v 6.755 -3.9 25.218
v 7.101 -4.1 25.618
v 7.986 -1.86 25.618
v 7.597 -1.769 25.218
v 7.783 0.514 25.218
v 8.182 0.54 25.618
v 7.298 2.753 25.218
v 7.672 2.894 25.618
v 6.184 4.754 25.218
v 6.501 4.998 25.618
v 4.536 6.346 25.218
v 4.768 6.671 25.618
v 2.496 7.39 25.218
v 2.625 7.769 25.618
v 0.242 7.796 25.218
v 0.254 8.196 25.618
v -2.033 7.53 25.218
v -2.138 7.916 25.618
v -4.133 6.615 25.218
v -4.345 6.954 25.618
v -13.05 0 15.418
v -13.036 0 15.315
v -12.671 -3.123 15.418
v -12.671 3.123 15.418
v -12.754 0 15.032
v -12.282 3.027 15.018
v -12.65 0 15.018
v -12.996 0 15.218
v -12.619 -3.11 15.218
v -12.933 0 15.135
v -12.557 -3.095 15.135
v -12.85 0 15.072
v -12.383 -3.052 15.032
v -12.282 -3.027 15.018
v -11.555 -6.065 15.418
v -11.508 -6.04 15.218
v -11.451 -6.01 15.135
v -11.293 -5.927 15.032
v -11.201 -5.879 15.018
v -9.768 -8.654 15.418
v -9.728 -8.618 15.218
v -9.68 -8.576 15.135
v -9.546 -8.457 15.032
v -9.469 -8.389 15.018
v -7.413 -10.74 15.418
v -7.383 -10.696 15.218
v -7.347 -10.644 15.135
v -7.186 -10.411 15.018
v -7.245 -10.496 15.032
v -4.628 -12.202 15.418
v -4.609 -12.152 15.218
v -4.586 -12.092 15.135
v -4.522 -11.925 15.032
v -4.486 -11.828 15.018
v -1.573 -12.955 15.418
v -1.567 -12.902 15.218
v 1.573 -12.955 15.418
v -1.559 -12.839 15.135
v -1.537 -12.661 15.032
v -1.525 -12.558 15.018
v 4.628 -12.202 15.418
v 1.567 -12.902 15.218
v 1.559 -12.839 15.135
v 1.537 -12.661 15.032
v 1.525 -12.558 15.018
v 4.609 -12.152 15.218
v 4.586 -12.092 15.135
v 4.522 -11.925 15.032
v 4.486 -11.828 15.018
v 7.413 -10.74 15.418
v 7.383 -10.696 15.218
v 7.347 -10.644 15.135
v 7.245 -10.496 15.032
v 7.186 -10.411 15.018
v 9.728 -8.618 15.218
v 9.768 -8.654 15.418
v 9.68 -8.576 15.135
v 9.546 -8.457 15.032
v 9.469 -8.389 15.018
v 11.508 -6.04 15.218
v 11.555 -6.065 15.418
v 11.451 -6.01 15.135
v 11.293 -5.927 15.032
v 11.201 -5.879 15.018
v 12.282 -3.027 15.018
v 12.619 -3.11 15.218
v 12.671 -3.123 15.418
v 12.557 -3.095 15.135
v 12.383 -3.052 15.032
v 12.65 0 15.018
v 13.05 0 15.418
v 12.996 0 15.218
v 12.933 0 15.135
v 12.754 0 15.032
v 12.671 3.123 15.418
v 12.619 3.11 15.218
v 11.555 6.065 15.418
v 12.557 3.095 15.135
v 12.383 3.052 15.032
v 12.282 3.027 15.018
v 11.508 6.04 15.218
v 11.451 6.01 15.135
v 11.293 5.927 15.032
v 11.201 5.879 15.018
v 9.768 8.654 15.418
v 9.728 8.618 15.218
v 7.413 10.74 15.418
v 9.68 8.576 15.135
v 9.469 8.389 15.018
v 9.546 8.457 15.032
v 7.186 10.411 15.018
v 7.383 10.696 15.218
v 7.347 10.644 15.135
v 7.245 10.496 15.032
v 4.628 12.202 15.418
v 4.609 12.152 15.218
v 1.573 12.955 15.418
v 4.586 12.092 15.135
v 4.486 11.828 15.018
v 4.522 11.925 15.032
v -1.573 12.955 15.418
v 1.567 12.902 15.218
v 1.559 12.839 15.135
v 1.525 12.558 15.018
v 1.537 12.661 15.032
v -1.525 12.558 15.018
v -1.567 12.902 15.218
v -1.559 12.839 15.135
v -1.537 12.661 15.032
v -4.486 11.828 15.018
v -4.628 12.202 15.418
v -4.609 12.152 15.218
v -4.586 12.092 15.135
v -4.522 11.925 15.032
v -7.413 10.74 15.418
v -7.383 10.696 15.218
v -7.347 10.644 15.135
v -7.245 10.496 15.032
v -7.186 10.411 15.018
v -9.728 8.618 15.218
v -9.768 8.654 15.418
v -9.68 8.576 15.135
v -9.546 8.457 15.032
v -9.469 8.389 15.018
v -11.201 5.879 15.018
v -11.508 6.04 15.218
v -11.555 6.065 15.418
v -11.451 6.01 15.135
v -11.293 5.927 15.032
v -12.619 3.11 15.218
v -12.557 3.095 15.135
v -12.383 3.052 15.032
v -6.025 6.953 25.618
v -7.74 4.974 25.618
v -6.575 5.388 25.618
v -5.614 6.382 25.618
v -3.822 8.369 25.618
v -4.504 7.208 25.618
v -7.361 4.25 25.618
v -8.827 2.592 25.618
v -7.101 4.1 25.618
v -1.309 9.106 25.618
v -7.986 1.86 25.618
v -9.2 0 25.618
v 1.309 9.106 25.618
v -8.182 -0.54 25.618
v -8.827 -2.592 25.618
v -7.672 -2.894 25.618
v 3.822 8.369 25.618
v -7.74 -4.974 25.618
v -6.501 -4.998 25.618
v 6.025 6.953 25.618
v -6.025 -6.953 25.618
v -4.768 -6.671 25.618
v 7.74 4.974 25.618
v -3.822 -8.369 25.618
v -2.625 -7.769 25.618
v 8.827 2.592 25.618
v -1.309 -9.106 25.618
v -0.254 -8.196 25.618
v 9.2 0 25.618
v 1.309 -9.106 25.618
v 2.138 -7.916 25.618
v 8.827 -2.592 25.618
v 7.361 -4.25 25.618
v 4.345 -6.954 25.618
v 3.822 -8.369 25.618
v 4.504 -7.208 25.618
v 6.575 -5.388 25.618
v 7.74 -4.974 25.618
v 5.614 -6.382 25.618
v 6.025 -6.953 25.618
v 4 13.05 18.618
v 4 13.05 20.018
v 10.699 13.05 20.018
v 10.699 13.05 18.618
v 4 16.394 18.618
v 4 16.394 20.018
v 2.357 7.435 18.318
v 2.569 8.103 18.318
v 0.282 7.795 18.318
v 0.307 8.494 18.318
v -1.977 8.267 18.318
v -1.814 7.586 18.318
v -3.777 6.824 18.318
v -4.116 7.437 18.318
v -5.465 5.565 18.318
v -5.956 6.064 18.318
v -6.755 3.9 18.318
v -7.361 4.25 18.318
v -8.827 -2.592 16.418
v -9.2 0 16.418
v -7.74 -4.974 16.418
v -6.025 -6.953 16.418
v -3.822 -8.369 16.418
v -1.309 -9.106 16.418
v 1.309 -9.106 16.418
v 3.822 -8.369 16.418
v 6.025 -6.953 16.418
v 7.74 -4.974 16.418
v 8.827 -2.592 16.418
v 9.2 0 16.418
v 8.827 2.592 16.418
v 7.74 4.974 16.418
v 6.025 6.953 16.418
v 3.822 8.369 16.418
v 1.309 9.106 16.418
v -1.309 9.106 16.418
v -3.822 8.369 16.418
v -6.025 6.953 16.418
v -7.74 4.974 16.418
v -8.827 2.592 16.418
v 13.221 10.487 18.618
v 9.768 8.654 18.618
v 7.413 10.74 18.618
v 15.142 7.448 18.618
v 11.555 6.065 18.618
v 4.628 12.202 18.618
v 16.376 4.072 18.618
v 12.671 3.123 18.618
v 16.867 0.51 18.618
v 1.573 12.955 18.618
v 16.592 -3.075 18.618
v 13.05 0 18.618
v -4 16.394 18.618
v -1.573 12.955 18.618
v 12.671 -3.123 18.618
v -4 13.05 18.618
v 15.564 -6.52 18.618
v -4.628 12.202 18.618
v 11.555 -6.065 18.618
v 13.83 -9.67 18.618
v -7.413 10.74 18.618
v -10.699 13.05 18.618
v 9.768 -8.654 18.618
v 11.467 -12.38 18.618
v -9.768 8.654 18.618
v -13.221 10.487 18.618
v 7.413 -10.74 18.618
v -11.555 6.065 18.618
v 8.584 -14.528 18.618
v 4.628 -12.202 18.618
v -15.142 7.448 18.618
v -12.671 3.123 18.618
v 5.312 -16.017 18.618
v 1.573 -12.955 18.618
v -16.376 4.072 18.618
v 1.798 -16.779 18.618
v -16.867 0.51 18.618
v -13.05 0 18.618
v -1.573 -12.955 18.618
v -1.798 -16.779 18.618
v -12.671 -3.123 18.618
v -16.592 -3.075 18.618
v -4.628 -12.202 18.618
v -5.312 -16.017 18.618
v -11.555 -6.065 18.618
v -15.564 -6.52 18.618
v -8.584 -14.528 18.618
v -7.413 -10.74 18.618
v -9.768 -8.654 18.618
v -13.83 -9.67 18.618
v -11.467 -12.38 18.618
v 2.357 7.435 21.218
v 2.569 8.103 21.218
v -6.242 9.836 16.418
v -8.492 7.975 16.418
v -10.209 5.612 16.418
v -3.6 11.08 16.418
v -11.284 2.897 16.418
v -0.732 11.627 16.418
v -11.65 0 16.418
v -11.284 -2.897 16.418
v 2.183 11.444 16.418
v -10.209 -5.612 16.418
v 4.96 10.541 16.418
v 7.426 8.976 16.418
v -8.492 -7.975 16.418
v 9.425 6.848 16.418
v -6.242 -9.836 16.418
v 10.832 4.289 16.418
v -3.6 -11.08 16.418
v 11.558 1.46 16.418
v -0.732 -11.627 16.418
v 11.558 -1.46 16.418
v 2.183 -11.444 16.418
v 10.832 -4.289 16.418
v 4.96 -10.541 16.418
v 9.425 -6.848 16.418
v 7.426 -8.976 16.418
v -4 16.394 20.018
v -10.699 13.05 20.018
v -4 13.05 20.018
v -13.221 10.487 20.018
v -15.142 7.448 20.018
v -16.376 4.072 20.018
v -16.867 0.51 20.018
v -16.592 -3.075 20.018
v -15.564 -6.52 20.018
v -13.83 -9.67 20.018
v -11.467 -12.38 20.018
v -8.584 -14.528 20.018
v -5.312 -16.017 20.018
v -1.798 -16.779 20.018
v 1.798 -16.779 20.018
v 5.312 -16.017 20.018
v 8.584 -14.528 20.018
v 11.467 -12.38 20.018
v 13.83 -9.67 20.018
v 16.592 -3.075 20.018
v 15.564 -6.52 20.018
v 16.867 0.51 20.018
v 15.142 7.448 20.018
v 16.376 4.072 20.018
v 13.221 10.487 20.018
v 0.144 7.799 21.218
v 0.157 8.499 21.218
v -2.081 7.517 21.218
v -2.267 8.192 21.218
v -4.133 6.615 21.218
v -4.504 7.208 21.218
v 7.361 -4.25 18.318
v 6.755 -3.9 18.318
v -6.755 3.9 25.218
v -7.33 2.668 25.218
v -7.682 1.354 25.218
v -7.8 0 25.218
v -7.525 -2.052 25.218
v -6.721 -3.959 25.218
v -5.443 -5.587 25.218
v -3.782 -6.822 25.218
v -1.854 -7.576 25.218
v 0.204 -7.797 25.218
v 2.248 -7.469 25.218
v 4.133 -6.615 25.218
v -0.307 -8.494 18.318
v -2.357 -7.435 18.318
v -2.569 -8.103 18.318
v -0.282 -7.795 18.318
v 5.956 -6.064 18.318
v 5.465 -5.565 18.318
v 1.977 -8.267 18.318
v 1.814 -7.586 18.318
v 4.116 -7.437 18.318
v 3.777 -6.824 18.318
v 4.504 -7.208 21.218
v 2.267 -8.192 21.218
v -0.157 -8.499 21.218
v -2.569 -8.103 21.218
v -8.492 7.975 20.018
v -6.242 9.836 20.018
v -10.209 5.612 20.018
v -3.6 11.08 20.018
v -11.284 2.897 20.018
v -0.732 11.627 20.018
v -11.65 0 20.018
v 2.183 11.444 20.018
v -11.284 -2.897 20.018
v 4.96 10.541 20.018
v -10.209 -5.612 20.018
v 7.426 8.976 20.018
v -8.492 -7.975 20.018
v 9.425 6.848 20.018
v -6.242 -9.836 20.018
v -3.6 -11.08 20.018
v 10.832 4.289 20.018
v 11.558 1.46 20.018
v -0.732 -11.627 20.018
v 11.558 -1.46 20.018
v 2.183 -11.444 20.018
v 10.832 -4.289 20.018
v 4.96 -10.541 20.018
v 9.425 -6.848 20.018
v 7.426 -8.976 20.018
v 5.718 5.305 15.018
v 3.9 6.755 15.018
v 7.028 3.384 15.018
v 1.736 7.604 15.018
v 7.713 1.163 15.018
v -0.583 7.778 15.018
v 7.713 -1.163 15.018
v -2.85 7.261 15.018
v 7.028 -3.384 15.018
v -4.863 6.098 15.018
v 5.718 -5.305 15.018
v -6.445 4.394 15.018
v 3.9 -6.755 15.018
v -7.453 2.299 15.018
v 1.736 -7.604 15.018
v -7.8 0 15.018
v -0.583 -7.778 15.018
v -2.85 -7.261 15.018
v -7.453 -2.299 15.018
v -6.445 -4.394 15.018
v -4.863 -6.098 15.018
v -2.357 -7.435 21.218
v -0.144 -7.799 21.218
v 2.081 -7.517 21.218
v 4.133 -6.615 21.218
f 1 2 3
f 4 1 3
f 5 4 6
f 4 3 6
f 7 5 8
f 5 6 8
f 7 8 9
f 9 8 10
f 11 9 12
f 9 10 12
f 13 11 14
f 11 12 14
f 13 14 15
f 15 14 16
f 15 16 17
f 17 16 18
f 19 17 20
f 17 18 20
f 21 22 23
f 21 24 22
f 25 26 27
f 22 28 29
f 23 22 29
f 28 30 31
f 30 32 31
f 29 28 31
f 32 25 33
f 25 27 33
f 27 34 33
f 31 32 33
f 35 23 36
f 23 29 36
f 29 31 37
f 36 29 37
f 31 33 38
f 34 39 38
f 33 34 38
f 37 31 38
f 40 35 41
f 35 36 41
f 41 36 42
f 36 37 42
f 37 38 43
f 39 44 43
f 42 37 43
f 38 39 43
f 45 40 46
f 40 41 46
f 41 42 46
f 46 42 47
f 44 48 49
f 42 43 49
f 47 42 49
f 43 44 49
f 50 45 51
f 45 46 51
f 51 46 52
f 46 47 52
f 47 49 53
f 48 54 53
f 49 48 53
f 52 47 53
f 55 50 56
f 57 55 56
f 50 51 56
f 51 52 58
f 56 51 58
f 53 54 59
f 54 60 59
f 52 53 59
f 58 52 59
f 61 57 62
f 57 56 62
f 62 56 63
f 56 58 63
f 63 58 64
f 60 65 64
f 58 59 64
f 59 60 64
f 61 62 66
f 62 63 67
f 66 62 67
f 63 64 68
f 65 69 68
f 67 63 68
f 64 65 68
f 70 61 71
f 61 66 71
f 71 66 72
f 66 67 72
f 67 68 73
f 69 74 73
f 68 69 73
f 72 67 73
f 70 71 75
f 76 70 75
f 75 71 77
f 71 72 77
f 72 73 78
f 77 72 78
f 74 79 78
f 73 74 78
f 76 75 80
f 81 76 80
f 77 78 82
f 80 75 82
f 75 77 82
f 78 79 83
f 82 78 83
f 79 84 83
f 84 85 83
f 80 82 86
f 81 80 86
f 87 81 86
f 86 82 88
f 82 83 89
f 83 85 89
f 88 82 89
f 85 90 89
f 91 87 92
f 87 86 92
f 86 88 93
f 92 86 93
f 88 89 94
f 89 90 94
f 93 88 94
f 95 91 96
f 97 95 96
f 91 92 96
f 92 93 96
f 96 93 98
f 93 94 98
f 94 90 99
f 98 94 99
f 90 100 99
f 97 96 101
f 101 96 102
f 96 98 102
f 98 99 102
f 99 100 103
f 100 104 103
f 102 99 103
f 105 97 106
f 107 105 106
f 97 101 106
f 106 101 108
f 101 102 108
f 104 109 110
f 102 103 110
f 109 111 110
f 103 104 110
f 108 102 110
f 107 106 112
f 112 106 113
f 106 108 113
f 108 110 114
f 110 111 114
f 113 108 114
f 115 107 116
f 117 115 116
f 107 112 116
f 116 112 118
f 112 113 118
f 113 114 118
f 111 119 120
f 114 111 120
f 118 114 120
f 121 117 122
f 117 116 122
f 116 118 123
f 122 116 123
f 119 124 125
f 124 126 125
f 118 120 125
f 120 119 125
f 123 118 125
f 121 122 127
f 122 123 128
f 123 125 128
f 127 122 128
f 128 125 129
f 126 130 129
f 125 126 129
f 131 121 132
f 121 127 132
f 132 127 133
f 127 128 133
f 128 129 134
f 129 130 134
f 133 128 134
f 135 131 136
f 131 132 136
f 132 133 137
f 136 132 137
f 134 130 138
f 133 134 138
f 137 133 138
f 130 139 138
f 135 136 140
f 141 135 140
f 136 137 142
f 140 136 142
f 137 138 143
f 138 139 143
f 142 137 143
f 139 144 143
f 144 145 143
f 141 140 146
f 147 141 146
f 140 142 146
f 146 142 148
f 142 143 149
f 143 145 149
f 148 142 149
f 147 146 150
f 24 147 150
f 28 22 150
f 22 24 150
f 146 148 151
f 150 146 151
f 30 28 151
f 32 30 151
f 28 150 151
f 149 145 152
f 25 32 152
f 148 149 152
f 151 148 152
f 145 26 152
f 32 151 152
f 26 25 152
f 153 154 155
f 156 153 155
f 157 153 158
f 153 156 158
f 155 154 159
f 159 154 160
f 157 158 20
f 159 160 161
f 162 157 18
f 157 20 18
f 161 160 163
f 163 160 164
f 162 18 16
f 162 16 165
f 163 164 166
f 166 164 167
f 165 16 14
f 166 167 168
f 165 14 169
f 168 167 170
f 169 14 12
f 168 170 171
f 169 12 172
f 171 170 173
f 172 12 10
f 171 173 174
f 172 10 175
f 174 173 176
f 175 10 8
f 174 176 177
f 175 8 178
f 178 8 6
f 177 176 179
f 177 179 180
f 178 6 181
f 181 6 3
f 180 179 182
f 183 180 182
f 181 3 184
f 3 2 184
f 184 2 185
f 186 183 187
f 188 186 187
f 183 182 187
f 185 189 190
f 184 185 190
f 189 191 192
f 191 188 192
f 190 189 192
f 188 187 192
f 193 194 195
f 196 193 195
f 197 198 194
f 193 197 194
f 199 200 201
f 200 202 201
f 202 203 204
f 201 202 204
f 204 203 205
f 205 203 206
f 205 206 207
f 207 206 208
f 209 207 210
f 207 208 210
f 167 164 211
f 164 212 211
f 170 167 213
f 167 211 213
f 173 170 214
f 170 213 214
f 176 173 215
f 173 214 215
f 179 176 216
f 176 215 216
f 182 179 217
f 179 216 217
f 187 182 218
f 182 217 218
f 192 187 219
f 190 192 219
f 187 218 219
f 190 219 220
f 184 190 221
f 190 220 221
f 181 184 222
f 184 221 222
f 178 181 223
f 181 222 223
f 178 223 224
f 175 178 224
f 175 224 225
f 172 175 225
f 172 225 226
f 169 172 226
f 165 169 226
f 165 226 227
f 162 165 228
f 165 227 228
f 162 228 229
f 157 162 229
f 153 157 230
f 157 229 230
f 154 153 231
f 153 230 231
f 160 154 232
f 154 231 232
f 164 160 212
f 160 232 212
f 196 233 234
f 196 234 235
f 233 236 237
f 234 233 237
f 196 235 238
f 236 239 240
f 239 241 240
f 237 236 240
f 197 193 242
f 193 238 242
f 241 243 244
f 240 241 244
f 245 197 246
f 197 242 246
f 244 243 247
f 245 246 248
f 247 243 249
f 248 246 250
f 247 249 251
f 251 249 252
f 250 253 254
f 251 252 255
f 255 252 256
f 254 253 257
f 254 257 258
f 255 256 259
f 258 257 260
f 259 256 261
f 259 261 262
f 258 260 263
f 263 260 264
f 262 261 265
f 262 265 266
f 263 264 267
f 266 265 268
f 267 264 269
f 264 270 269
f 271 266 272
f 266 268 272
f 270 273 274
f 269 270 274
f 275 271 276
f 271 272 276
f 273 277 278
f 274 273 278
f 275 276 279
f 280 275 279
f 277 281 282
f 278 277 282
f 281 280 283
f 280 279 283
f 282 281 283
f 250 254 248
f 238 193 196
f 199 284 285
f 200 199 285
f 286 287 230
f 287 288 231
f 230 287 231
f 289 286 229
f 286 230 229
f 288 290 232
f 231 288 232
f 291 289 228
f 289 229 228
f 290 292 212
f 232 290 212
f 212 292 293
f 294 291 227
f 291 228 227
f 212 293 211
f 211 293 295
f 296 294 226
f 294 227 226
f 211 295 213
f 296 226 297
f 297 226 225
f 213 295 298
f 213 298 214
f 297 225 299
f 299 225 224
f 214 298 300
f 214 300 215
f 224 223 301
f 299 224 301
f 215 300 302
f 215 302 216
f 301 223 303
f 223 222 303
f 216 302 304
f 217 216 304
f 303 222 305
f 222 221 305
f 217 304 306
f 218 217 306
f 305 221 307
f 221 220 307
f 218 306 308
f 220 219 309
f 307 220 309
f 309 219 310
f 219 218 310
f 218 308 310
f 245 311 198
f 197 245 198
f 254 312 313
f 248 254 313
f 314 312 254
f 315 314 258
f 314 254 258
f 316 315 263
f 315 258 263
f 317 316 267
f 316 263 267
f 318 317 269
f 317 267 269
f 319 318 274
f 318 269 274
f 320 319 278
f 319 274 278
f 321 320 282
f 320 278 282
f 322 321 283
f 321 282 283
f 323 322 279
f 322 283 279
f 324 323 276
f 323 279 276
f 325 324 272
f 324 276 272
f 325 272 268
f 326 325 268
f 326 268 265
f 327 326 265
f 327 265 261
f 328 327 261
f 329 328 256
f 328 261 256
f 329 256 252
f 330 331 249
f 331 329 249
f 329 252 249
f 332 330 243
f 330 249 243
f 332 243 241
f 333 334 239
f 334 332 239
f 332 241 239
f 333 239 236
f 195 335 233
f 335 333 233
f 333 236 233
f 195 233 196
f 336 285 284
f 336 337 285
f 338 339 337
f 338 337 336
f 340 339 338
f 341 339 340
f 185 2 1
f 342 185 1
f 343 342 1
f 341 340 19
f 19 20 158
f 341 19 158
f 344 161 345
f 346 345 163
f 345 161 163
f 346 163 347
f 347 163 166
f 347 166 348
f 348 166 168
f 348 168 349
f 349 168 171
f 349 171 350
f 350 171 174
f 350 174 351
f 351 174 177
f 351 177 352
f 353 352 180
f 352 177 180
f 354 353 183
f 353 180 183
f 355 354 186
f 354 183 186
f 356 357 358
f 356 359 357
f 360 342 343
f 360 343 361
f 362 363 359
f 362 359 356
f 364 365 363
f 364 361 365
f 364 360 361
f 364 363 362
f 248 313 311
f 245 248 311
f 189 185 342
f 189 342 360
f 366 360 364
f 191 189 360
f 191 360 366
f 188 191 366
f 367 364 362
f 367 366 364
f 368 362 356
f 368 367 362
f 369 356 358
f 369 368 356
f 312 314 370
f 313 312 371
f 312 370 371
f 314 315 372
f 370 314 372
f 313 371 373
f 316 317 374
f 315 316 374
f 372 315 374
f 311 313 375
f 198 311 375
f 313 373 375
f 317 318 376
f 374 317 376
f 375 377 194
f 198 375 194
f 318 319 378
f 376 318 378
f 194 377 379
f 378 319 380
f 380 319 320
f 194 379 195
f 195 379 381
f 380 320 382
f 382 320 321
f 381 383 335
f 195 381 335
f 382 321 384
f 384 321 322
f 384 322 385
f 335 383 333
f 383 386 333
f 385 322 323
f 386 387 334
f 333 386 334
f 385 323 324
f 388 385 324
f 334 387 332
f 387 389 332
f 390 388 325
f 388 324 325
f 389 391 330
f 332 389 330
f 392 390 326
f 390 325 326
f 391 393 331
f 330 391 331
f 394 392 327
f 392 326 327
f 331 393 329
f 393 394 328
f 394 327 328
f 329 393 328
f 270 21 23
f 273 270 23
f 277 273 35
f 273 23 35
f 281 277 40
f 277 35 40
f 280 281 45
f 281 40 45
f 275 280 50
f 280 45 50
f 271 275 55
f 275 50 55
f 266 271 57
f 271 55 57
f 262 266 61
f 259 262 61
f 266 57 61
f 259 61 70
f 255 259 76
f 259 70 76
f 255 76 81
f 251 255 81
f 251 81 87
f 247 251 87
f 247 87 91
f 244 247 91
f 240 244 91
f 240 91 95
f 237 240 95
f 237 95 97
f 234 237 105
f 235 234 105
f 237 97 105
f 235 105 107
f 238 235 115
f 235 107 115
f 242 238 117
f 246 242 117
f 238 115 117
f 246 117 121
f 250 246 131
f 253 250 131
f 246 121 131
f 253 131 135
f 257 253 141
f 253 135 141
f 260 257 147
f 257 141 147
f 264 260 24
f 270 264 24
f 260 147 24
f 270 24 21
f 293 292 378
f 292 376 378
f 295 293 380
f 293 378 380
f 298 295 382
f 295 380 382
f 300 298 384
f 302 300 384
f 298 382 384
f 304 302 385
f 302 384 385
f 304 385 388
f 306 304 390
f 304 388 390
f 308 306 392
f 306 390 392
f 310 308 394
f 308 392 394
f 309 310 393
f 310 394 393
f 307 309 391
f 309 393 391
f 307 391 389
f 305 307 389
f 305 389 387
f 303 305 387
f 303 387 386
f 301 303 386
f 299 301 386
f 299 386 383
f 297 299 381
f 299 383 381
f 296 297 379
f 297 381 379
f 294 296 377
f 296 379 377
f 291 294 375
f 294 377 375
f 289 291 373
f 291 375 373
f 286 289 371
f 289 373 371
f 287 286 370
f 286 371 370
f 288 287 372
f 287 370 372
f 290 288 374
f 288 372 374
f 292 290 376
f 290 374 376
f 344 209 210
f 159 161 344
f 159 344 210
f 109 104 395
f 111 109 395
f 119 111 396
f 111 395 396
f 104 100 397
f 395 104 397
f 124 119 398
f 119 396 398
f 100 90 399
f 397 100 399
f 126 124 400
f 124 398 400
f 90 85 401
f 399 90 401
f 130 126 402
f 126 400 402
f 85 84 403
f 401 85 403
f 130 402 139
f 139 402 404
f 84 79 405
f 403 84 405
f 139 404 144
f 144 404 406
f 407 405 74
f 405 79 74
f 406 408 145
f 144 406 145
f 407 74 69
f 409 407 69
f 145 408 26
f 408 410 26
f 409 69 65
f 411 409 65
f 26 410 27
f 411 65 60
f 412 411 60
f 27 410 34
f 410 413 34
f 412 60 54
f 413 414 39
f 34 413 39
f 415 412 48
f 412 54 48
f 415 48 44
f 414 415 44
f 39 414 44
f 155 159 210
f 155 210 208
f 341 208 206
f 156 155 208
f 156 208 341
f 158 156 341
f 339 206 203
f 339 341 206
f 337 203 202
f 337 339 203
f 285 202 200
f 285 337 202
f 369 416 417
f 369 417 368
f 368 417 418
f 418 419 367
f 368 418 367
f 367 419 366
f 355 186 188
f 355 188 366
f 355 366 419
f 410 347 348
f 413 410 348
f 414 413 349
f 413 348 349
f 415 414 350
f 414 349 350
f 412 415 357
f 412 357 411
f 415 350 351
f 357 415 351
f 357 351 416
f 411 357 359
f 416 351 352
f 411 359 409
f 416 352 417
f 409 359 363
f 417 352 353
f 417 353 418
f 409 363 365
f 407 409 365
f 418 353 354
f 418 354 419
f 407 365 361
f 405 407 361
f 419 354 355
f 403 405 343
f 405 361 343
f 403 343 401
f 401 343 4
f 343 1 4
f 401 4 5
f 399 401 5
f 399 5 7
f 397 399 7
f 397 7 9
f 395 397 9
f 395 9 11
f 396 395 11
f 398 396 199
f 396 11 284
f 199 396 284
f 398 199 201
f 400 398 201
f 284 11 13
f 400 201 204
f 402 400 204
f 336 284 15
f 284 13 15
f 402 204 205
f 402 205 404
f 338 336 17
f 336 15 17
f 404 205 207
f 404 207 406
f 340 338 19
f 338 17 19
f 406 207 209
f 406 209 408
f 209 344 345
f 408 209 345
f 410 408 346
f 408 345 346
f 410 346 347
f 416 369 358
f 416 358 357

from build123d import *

# Parameters (mm, degrees)
F3_DEPTH       = 5.001
F4_W           = 0.7
F4_H           = 2.9
F5_ANGLE_BACK  = 17.589911292
F5_ANGLE       = 77.589911292
F6_W           = 0.7
F6_H           = 7.3
F7_ANGLE_START = 300
F7_ANGLE       = 28
F8_SIZE        = 0.4
F9_R           = 0.4


with BuildPart() as f1:
    # F0 (on Front) → F1 (revolve)
    with BuildSketch(Plane.XZ):
        Polygon((-13.05, 15.0180591579), (-7.8, 15.0180591579), (-7.8, 25.6180591579), (-9.2, 25.6180591579), (-9.2, 16.4180591579), (-11.65, 16.4180591579), (-11.65, 20.0180591579), (-16.875, 20.0180591579), (-16.875, 18.6180591579), (-13.05, 18.6180591579), align=None)
    revolve(axis=Axis((0, 0, 52.8953172941), (0, 0, 1)))

    # F2 (on face) → F3 (cut, through all)
    with BuildSketch(Plane.XY.offset(20.0180591579)):
        with BuildLine():
            Line((-4, 13.05), (-4, 16.3940728619))
            ThreePointArc((-4, 16.3940728619), (-7.5371728948, 15.0982333322), (-10.6987440852, 13.05))
            Line((-10.6987440852, 13.05), (-4, 13.05))
        make_face()
        with BuildLine():
            ThreePointArc((10.6987440852, 13.05), (7.5371728948, 15.0982333322), (4, 16.3940728619))
            Line((4, 16.3940728619), (4, 13.05))
            Line((4, 13.05), (10.6987440852, 13.05))
        make_face()
        with BuildLine():
            ThreePointArc((4, 16.3940728619), (0, 16.875), (-4, 16.3940728619))
            Line((-4, 16.3940728619), (4, 16.3940728619))
        make_face()
    extrude(amount=-F3_DEPTH, mode=Mode.SUBTRACT)

    # F4 (on Right) → F5 (revolve, cut)
    with BuildSketch(Plane.YZ, mode=Mode.PRIVATE) as f5_sk:
        with Locations((8.15, 19.7680591579)):
            Rectangle(F4_W, F4_H)
        with Locations((-8.15, 19.7680591579)):
            Rectangle(F4_W, F4_H)
    revolve(f5_sk.sketch.rotate(Axis((0, 0, 20.0180591579), (0, 0, 1)), -F5_ANGLE_BACK), axis=Axis((0, 0, 20.0180591579), (0, 0, 1)), revolution_arc=F5_ANGLE, mode=Mode.SUBTRACT)

    # F6 (on Right) → F7 (revolve, cut)
    with BuildSketch(Plane.YZ, mode=Mode.PRIVATE) as f7_sk:
        with Locations((8.15, 21.9680591579)):
            Rectangle(F6_W, F6_H)
        with Locations((-8.15, 21.9680591579)):
            Rectangle(F6_W, F6_H)
    revolve(f7_sk.sketch.rotate(Axis((0, 0, 15.0180591579), (0, 0, -1)), F7_ANGLE_START), axis=Axis((0, 0, 15.0180591579), (0, 0, -1)), revolution_arc=F7_ANGLE, mode=Mode.SUBTRACT)

    # F8
    f8_edges = [f1.edges().sort_by_distance(p)[0] for p in [
        (5.418335, 5.61085, 25.618059),
        (-7.534221, 2.018789, 25.618059),
    ]]
    chamfer(f8_edges, length=F8_SIZE)

    # F9
    f9_edges = [f1.edges().sort_by_distance(p)[0] for p in [
        (13.05, 0, 15.018059),
    ]]
    fillet(f9_edges, radius=F9_R)


solid = f1.part
